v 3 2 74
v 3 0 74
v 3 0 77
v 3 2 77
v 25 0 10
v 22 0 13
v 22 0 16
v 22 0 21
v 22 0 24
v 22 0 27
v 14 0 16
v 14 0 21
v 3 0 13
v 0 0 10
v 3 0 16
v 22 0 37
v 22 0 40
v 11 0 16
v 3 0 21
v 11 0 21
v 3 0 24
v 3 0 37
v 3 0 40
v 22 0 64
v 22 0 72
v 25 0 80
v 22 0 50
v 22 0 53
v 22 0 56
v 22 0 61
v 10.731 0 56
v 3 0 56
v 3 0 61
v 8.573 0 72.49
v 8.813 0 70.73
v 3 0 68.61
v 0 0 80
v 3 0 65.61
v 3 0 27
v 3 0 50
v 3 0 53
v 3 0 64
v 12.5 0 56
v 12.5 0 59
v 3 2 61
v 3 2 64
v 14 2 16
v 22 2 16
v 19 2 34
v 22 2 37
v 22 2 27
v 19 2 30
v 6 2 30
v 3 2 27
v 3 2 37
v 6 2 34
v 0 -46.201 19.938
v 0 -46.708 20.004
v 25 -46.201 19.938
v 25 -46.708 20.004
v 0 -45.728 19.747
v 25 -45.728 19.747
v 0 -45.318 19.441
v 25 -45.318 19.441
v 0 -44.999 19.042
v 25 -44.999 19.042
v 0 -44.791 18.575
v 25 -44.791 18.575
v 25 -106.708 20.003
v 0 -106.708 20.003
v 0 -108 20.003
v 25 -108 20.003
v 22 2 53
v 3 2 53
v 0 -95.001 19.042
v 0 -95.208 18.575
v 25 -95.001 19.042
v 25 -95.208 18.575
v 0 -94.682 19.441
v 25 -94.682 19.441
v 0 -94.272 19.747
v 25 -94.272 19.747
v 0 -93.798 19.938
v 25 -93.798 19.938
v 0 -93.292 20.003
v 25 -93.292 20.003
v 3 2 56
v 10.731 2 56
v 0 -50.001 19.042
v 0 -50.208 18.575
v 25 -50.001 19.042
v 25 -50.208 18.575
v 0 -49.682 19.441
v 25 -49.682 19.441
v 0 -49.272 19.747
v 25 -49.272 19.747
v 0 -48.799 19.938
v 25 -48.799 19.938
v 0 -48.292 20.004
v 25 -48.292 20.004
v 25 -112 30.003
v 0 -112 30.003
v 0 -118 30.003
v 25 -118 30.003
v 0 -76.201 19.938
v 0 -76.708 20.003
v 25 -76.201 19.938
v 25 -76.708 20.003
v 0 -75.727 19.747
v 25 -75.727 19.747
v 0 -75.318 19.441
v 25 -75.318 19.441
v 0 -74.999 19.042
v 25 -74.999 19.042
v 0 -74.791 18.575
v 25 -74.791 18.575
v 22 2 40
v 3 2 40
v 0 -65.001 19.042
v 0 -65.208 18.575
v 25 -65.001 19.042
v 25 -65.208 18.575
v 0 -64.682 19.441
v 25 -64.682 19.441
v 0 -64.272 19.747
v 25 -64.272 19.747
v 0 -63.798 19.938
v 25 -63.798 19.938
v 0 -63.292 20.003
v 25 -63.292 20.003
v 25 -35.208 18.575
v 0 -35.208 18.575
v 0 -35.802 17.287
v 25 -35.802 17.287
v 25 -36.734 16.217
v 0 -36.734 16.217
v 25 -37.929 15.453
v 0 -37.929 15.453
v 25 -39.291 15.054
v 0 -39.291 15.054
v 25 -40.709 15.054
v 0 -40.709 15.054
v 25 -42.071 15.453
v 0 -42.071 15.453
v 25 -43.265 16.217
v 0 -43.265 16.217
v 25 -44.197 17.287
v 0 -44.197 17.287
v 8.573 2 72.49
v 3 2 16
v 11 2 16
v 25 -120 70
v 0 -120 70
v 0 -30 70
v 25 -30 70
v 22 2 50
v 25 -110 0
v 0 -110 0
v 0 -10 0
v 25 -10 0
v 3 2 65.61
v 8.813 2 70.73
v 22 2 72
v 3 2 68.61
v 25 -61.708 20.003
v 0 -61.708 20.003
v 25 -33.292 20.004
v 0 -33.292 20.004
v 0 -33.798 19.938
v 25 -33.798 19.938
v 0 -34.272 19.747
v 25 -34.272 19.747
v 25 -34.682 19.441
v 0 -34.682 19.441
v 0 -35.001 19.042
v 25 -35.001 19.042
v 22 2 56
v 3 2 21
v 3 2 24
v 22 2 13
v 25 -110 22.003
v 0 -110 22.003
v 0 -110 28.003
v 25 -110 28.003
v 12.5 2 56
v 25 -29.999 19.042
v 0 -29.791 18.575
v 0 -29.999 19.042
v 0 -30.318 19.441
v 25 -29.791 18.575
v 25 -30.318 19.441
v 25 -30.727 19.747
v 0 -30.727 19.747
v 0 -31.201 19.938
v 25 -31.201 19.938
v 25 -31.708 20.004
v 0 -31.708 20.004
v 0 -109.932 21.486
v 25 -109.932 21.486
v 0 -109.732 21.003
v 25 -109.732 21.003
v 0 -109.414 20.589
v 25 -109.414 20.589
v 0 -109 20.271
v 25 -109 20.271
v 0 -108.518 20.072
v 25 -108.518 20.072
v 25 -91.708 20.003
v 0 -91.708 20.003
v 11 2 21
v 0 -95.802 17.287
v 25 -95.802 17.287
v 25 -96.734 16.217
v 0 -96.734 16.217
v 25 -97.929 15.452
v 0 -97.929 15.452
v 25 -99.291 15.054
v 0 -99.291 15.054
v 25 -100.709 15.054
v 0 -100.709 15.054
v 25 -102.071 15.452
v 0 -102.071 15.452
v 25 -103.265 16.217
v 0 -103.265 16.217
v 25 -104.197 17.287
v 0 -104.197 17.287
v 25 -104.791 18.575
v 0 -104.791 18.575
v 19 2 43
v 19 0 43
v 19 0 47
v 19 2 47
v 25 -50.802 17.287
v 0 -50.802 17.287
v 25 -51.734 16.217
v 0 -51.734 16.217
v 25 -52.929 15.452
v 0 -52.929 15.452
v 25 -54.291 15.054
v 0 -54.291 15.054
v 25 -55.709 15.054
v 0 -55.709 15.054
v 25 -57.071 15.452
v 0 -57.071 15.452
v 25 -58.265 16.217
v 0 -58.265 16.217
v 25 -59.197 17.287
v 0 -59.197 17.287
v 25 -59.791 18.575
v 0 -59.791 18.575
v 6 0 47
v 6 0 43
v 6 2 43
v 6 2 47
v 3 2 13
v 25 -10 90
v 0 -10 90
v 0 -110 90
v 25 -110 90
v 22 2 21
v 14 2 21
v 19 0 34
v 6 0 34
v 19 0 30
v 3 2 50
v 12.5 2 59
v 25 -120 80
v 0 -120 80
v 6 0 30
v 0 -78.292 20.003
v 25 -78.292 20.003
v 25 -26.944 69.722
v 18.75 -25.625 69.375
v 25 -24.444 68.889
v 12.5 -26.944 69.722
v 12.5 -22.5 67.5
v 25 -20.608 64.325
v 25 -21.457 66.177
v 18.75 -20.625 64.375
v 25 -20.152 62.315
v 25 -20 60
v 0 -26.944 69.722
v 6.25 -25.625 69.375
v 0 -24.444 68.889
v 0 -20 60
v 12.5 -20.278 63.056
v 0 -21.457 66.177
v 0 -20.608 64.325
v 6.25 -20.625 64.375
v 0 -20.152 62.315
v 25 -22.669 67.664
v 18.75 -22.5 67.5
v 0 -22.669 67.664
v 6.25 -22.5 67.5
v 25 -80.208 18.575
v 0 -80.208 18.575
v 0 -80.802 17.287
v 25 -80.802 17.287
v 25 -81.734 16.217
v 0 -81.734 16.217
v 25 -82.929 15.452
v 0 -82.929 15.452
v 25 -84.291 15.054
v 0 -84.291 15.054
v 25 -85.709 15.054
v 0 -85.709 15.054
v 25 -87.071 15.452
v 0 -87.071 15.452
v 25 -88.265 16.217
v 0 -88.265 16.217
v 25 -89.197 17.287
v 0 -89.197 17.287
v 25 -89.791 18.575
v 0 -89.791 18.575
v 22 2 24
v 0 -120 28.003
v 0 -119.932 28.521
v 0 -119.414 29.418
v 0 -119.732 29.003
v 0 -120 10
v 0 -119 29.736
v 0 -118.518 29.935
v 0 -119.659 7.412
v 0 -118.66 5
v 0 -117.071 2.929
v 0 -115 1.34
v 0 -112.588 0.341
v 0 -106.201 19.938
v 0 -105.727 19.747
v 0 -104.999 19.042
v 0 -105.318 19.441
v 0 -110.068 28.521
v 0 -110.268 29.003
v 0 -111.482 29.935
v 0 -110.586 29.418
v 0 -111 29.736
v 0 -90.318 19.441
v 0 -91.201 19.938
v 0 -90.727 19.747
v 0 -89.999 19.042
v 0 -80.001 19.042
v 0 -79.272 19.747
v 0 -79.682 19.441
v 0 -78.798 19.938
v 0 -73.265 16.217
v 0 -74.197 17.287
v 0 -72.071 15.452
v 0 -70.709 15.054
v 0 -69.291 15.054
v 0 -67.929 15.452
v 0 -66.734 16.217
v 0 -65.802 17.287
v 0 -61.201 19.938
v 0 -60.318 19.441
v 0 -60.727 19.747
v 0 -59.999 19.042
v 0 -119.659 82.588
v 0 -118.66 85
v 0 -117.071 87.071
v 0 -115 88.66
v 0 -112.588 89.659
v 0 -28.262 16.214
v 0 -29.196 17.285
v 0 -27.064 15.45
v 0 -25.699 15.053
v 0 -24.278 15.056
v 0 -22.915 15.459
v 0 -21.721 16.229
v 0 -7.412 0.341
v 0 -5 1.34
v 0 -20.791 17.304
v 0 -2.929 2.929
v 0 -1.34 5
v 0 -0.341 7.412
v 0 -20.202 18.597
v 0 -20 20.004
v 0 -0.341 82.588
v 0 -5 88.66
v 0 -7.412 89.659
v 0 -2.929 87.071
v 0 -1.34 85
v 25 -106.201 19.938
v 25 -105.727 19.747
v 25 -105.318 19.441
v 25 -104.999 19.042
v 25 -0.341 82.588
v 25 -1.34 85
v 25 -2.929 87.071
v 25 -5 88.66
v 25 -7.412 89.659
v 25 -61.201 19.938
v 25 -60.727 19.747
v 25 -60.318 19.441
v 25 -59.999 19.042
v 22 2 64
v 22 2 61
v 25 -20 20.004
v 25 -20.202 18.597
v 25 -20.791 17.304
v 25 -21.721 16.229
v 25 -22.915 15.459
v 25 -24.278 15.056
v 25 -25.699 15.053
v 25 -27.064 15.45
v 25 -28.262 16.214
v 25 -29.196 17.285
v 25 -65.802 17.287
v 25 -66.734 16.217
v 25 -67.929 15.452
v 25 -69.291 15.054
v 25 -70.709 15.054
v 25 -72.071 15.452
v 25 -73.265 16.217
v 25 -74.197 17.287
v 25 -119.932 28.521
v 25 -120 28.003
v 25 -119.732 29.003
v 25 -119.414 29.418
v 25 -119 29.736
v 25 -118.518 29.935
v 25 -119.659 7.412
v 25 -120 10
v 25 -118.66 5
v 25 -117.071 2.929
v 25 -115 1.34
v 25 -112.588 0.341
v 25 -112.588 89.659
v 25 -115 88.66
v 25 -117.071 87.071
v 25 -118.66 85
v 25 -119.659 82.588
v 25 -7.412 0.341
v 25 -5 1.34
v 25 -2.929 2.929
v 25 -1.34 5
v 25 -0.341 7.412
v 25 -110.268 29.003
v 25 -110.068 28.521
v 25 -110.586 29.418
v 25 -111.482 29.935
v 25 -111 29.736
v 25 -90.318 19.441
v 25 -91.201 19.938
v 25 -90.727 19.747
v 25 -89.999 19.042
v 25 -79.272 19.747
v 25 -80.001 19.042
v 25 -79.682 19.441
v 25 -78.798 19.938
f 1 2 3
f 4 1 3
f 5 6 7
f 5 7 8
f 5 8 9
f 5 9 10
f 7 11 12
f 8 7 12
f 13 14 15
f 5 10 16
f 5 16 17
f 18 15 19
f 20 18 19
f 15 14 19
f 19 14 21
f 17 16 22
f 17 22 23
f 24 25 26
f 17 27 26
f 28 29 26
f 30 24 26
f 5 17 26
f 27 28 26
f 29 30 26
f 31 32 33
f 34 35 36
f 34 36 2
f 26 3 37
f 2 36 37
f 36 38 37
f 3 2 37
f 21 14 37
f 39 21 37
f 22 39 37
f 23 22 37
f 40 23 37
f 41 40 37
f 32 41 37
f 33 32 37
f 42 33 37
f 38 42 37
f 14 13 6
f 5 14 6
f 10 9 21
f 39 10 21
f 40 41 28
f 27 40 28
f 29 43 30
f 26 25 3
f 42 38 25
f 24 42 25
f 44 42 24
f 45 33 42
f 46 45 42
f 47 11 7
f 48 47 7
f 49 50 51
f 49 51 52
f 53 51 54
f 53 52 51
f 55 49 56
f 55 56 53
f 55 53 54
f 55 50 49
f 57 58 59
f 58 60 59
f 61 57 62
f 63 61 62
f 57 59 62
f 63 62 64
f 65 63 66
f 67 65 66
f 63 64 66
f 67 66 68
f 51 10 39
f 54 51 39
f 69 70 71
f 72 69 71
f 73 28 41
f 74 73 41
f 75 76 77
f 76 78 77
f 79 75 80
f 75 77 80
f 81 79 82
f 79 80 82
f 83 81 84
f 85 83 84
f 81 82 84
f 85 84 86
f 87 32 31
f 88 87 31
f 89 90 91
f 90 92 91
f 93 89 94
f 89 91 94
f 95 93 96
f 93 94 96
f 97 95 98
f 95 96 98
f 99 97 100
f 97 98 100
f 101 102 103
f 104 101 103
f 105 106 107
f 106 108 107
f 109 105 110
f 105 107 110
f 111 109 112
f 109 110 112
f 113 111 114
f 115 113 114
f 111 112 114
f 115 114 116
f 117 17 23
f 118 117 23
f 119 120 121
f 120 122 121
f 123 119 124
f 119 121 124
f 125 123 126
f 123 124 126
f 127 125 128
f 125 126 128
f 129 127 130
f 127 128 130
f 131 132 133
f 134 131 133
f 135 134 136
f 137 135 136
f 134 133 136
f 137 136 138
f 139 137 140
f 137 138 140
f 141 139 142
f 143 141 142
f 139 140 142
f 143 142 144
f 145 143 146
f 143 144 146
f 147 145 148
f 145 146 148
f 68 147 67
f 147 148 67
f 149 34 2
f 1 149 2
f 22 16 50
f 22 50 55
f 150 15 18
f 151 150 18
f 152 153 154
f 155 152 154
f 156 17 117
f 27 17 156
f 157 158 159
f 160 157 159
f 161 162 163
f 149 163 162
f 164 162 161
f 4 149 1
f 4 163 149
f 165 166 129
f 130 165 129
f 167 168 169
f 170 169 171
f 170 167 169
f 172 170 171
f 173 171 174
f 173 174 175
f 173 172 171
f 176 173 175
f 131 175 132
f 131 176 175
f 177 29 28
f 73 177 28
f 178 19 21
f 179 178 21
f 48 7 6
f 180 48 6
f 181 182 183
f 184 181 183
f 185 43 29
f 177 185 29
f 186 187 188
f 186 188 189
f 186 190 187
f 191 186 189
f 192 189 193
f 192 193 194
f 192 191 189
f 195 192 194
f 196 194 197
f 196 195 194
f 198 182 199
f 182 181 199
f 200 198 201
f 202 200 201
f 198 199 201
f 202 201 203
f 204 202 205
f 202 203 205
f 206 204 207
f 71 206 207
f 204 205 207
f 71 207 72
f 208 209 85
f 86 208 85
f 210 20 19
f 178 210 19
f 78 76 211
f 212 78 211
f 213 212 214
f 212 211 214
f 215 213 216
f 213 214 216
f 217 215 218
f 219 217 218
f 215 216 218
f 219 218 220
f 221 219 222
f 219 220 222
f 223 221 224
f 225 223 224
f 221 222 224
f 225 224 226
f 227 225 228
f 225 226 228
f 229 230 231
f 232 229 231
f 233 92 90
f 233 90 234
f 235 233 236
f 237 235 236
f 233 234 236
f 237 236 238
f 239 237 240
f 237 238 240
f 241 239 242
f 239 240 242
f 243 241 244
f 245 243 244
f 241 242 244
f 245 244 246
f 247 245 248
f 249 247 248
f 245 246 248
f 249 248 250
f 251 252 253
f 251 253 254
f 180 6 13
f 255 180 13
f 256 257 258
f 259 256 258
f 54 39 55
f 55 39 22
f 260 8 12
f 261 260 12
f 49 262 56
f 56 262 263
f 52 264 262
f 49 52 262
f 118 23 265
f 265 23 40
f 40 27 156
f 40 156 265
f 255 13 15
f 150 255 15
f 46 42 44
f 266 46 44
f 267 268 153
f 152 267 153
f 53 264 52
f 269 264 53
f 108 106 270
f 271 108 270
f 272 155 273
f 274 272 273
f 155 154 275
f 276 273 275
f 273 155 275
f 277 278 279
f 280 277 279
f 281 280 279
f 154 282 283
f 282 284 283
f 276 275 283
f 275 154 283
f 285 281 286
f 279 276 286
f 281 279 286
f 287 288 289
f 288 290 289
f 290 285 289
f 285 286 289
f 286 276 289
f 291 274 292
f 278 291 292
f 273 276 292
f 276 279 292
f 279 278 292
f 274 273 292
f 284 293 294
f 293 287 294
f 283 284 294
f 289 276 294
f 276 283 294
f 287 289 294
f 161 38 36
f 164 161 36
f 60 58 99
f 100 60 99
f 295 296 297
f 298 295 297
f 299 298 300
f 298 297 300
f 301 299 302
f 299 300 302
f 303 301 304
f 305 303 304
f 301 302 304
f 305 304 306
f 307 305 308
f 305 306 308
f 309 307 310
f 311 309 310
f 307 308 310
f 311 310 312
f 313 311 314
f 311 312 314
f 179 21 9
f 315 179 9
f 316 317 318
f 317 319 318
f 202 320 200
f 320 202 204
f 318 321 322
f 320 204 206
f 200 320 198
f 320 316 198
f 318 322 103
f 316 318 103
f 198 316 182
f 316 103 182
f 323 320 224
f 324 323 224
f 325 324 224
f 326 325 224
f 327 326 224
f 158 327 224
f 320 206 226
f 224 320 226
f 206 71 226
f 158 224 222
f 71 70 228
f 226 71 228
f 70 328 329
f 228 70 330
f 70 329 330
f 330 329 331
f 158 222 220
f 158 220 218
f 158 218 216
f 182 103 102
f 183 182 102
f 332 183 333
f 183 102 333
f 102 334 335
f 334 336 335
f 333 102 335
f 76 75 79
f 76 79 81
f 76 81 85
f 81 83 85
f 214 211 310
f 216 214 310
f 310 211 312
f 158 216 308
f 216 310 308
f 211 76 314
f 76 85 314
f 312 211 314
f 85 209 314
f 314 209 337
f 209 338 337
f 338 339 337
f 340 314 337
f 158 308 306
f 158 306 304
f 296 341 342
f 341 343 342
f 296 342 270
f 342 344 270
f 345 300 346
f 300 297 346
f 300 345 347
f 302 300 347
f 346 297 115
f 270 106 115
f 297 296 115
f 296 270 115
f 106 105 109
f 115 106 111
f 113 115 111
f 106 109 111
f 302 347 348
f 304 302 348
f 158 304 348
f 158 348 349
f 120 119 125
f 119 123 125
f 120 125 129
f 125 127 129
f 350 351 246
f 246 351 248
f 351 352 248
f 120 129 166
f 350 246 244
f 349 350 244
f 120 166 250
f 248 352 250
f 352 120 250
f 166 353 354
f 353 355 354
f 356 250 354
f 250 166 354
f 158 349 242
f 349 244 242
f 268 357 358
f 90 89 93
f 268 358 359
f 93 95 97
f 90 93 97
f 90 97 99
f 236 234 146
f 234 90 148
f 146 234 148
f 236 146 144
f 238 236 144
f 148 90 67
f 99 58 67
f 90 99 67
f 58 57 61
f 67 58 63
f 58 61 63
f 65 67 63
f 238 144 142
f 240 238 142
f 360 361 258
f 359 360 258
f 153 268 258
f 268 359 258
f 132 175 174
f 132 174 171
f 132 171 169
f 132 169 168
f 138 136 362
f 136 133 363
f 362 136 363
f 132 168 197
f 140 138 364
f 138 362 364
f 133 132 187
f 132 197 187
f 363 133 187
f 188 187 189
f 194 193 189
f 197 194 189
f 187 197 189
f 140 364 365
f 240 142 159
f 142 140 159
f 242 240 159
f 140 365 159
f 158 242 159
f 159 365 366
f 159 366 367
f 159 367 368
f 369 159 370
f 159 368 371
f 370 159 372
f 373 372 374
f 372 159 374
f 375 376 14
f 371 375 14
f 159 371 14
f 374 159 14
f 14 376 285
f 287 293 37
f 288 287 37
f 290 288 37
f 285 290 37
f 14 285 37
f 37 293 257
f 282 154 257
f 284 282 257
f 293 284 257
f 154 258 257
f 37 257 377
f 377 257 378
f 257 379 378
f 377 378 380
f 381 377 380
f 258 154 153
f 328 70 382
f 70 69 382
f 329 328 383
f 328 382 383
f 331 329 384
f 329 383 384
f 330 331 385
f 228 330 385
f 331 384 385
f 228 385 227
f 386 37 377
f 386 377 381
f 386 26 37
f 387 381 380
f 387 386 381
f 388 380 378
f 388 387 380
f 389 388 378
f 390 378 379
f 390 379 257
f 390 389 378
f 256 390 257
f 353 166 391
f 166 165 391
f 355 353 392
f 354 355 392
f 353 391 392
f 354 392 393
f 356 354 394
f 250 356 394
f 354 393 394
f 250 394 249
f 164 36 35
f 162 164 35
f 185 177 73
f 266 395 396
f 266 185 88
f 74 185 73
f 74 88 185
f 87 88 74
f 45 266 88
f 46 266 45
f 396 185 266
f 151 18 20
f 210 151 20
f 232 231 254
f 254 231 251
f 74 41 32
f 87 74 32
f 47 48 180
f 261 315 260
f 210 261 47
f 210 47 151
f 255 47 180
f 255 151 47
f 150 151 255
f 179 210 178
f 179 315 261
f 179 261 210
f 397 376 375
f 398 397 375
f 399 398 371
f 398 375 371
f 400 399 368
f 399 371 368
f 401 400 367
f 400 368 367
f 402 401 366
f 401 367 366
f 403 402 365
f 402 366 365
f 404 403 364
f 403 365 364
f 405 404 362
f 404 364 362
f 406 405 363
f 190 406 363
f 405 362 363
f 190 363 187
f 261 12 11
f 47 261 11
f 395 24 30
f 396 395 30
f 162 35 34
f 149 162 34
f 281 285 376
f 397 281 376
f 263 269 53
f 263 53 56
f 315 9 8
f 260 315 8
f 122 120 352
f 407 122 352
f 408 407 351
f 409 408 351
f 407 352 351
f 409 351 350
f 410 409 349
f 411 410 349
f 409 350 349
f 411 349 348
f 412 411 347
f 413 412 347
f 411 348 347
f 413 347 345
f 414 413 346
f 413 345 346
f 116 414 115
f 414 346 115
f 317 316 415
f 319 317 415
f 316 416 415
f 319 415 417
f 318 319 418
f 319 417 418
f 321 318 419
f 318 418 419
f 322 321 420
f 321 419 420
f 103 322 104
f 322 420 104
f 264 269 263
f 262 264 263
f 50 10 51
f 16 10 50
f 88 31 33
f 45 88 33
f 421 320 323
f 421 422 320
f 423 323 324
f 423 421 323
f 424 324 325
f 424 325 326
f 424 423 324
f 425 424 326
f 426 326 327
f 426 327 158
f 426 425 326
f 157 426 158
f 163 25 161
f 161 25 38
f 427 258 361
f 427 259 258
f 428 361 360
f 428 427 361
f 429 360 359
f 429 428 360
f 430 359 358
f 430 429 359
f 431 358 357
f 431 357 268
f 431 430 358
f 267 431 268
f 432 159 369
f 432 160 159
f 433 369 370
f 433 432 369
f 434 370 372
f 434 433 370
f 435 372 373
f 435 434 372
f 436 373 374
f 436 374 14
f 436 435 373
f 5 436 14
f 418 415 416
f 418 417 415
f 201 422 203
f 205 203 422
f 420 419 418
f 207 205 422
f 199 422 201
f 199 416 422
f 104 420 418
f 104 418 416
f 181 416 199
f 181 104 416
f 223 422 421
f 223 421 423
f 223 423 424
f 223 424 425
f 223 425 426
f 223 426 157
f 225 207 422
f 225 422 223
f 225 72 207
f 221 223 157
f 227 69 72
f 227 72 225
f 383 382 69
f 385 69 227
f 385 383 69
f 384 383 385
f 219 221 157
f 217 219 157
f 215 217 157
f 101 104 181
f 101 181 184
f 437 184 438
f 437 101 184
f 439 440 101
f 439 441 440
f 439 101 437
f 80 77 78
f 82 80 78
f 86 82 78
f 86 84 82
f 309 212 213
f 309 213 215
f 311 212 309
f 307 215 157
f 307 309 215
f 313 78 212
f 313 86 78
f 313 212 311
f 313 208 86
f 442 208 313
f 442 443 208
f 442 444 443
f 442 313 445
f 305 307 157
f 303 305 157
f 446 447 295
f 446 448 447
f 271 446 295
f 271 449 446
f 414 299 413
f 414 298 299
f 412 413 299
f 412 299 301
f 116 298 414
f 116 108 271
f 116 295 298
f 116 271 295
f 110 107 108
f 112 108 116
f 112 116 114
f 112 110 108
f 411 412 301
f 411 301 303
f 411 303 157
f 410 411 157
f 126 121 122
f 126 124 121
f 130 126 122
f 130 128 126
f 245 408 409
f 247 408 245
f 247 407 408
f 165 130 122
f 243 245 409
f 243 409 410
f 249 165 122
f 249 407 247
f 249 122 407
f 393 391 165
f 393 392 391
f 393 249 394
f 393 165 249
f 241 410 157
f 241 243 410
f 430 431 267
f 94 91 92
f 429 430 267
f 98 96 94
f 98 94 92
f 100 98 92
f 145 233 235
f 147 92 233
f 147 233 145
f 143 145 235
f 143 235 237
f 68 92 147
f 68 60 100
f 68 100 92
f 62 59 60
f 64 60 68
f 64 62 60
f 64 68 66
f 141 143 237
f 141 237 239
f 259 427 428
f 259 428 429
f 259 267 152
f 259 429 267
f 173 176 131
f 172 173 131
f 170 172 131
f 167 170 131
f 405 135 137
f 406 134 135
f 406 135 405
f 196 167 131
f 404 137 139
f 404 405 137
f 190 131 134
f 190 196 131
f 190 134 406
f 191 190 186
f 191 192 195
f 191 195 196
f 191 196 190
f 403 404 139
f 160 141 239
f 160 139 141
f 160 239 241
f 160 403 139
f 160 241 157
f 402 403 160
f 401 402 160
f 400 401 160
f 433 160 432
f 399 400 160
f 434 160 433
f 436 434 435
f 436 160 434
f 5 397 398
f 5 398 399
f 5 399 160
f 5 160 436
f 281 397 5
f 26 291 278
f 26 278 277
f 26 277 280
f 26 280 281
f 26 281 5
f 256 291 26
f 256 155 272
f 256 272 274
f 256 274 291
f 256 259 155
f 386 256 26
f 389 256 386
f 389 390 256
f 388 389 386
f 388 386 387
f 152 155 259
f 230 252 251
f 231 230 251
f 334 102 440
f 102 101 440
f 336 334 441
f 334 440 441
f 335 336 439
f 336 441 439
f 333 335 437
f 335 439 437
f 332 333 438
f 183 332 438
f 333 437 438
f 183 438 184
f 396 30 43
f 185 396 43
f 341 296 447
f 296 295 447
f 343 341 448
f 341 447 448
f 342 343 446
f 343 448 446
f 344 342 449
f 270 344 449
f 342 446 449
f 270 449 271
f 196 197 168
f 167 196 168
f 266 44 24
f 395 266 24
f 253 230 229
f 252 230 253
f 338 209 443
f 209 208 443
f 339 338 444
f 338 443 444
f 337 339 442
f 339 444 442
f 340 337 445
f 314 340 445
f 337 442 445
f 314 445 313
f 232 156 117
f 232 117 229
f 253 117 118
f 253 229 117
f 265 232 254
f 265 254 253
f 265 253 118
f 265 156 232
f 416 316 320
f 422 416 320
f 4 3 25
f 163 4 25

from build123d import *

# Parameters (mm, degrees)
F1_DEPTH    = 25
F2_R        = 10
F3_T1_DEPTH = 25
F4_R        = 2
F5_W        = 19
F5_H        = 10
F5_W_2      = 13
F5_H_2      = 4
F6_DEPTH    = 2


# Not quite as in the source:
# - a fillet or chamfer that OpenCascade refuses, or shapes differently, is made with other operations: its cross-section is extruded or revolved along the edge and cut away or added


with BuildPart() as f1:
    # F0 (on Right) → F1 (new body)
    with BuildSketch(Plane.YZ):
        with BuildLine():
            Line((-119.9998666872, 30.0034820876), (-120, 0))
            Line((-120, 0), (0, 0))
            Line((0, 0), (0, 90))
            Line((0, 90), (-120, 90))
            Line((-120, 90), (-120, 70))
            Line((-120, 70), (-20, 70))
            Line((-20, 70), (-20, 20.003633132))
            ThreePointArc((-20, 20.003633132), (-24.9999333448, 15.0036997872), (-29.9998666895, 20.003633132))
            Line((-29.9998666895, 20.003633132), (-34.9998666895, 20.003633132))
            ThreePointArc((-34.9998666895, 20.003633132), (-39.9998666895, 15.003633132), (-44.9998666895, 20.003633132))
            Line((-44.9998666895, 20.003633132), (-49.9998666872, 20.0034820876))
            ThreePointArc((-49.9998666872, 20.0034820876), (-54.9998666872, 15.0034820876), (-59.9998666872, 20.0034820876))
            Line((-59.9998666872, 20.0034820876), (-64.9998666872, 20.0034820876))
            ThreePointArc((-64.9998666872, 20.0034820876), (-69.9998666872, 15.0034820876), (-74.9998666872, 20.0034820876))
            Line((-74.9998666872, 20.0034820876), (-79.9998666872, 20.0034820876))
            ThreePointArc((-79.9998666872, 20.0034820876), (-84.9998666872, 15.0034820876), (-89.9998666872, 20.0034820876))
            Line((-89.9998666872, 20.0034820876), (-94.9998666872, 20.0034820876))
            ThreePointArc((-94.9998666872, 20.0034820876), (-99.9998666872, 15.0034820876), (-104.9998666872, 20.0034820876))
            Line((-104.9998666872, 20.0034820876), (-109.9998666872, 20.0034820876))
            Line((-109.9998666872, 20.0034820876), (-109.9998666872, 30.0034820876))
            Line((-109.9998666872, 30.0034820876), (-119.9998666872, 30.0034820876))
        make_face()
    extrude(amount=F1_DEPTH)

    # F2
    f2_edges = [f1.edges().sort_by_distance(p)[0] for p in [
        (12.5, -120, 90),
        (12.5, 0, 90),
        (12.5, 0, 0),
        (12.5, -120, 0),
    ]]
    fillet(f2_edges, radius=F2_R)

    # F3: fillet of radius 10 on 1 edges, made by hand

    # F3_s2 → F3_t1 (join)
    with BuildSketch(Plane.YZ):
        with BuildLine():
            add(Edge.make_bspline(
                [(-30, 70), (-20, 70), (-20, 60)],
                knots=[0, 0, 0, 1, 1, 1], degree=2, weights=[1, 1, 1]))
            Line((-20, 60), (-20, 70))
            Line((-20, 70), (-30, 70))
        make_face()
    extrude(amount=F3_T1_DEPTH)

    # F4
    f4_edges = [f1.edges().sort_by_distance(p)[0] for p in [
        (12.5, -119.999867, 30.003482),
        (12.5, -109.999867, 30.003482),
        (12.5, -109.999867, 20.003482),
        (12.5, -104.999867, 20.003482),
        (12.5, -94.999867, 20.003482),
        (12.5, -89.999867, 20.003482),
        (12.5, -79.999867, 20.003482),
        (12.5, -74.999867, 20.003482),
        (12.5, -64.999867, 20.003482),
        (12.5, -59.999867, 20.003482),
        (12.5, -49.999867, 20.003482),
        (12.5, -44.999867, 20.003633),
        (12.5, -34.999867, 20.003633),
        (12.5, -29.999867, 20.003633),
    ]]
    fillet(f4_edges, radius=F4_R)

    # F5 (on face) → F6 (join)
    with BuildSketch(Plane(origin=(0, 0, 0), x_dir=(-1, 0, 0), z_dir=(0, 1, 0))):
        Polygon((-22, 16), (-22, 13), (-3, 13), (-3, 16), (-11, 16), (-11, 21), (-3, 21), (-3, 24), (-22, 24), (-22, 21), (-14, 21), (-14, 16), align=None)
        with Locations((-12.5, 32)):
            Rectangle(F5_W, F5_H)
        with Locations((-12.5, 32)):
            Rectangle(F5_W_2, F5_H_2, mode=Mode.SUBTRACT)
        with Locations((-12.5, 45)):
            Rectangle(F5_W, F5_H)
        with Locations((-12.5, 45)):
            Rectangle(F5_W_2, F5_H_2, mode=Mode.SUBTRACT)
        Polygon((-22, 56), (-22, 53), (-3, 53), (-3, 56), (-10.7311028987, 56), (-3, 61), (-3, 64), (-12.5, 59), (-22, 64), (-22, 61), (-12.5, 56), align=None)
        Polygon((-22, 72), (-3, 65.6102970243), (-3, 68.6102970243), (-8.8134625163, 70.7304688778), (-8.5728853775, 72.4904765496), (-3, 74), (-3, 77), align=None)
    extrude(amount=F6_DEPTH)


solid = f1.part
